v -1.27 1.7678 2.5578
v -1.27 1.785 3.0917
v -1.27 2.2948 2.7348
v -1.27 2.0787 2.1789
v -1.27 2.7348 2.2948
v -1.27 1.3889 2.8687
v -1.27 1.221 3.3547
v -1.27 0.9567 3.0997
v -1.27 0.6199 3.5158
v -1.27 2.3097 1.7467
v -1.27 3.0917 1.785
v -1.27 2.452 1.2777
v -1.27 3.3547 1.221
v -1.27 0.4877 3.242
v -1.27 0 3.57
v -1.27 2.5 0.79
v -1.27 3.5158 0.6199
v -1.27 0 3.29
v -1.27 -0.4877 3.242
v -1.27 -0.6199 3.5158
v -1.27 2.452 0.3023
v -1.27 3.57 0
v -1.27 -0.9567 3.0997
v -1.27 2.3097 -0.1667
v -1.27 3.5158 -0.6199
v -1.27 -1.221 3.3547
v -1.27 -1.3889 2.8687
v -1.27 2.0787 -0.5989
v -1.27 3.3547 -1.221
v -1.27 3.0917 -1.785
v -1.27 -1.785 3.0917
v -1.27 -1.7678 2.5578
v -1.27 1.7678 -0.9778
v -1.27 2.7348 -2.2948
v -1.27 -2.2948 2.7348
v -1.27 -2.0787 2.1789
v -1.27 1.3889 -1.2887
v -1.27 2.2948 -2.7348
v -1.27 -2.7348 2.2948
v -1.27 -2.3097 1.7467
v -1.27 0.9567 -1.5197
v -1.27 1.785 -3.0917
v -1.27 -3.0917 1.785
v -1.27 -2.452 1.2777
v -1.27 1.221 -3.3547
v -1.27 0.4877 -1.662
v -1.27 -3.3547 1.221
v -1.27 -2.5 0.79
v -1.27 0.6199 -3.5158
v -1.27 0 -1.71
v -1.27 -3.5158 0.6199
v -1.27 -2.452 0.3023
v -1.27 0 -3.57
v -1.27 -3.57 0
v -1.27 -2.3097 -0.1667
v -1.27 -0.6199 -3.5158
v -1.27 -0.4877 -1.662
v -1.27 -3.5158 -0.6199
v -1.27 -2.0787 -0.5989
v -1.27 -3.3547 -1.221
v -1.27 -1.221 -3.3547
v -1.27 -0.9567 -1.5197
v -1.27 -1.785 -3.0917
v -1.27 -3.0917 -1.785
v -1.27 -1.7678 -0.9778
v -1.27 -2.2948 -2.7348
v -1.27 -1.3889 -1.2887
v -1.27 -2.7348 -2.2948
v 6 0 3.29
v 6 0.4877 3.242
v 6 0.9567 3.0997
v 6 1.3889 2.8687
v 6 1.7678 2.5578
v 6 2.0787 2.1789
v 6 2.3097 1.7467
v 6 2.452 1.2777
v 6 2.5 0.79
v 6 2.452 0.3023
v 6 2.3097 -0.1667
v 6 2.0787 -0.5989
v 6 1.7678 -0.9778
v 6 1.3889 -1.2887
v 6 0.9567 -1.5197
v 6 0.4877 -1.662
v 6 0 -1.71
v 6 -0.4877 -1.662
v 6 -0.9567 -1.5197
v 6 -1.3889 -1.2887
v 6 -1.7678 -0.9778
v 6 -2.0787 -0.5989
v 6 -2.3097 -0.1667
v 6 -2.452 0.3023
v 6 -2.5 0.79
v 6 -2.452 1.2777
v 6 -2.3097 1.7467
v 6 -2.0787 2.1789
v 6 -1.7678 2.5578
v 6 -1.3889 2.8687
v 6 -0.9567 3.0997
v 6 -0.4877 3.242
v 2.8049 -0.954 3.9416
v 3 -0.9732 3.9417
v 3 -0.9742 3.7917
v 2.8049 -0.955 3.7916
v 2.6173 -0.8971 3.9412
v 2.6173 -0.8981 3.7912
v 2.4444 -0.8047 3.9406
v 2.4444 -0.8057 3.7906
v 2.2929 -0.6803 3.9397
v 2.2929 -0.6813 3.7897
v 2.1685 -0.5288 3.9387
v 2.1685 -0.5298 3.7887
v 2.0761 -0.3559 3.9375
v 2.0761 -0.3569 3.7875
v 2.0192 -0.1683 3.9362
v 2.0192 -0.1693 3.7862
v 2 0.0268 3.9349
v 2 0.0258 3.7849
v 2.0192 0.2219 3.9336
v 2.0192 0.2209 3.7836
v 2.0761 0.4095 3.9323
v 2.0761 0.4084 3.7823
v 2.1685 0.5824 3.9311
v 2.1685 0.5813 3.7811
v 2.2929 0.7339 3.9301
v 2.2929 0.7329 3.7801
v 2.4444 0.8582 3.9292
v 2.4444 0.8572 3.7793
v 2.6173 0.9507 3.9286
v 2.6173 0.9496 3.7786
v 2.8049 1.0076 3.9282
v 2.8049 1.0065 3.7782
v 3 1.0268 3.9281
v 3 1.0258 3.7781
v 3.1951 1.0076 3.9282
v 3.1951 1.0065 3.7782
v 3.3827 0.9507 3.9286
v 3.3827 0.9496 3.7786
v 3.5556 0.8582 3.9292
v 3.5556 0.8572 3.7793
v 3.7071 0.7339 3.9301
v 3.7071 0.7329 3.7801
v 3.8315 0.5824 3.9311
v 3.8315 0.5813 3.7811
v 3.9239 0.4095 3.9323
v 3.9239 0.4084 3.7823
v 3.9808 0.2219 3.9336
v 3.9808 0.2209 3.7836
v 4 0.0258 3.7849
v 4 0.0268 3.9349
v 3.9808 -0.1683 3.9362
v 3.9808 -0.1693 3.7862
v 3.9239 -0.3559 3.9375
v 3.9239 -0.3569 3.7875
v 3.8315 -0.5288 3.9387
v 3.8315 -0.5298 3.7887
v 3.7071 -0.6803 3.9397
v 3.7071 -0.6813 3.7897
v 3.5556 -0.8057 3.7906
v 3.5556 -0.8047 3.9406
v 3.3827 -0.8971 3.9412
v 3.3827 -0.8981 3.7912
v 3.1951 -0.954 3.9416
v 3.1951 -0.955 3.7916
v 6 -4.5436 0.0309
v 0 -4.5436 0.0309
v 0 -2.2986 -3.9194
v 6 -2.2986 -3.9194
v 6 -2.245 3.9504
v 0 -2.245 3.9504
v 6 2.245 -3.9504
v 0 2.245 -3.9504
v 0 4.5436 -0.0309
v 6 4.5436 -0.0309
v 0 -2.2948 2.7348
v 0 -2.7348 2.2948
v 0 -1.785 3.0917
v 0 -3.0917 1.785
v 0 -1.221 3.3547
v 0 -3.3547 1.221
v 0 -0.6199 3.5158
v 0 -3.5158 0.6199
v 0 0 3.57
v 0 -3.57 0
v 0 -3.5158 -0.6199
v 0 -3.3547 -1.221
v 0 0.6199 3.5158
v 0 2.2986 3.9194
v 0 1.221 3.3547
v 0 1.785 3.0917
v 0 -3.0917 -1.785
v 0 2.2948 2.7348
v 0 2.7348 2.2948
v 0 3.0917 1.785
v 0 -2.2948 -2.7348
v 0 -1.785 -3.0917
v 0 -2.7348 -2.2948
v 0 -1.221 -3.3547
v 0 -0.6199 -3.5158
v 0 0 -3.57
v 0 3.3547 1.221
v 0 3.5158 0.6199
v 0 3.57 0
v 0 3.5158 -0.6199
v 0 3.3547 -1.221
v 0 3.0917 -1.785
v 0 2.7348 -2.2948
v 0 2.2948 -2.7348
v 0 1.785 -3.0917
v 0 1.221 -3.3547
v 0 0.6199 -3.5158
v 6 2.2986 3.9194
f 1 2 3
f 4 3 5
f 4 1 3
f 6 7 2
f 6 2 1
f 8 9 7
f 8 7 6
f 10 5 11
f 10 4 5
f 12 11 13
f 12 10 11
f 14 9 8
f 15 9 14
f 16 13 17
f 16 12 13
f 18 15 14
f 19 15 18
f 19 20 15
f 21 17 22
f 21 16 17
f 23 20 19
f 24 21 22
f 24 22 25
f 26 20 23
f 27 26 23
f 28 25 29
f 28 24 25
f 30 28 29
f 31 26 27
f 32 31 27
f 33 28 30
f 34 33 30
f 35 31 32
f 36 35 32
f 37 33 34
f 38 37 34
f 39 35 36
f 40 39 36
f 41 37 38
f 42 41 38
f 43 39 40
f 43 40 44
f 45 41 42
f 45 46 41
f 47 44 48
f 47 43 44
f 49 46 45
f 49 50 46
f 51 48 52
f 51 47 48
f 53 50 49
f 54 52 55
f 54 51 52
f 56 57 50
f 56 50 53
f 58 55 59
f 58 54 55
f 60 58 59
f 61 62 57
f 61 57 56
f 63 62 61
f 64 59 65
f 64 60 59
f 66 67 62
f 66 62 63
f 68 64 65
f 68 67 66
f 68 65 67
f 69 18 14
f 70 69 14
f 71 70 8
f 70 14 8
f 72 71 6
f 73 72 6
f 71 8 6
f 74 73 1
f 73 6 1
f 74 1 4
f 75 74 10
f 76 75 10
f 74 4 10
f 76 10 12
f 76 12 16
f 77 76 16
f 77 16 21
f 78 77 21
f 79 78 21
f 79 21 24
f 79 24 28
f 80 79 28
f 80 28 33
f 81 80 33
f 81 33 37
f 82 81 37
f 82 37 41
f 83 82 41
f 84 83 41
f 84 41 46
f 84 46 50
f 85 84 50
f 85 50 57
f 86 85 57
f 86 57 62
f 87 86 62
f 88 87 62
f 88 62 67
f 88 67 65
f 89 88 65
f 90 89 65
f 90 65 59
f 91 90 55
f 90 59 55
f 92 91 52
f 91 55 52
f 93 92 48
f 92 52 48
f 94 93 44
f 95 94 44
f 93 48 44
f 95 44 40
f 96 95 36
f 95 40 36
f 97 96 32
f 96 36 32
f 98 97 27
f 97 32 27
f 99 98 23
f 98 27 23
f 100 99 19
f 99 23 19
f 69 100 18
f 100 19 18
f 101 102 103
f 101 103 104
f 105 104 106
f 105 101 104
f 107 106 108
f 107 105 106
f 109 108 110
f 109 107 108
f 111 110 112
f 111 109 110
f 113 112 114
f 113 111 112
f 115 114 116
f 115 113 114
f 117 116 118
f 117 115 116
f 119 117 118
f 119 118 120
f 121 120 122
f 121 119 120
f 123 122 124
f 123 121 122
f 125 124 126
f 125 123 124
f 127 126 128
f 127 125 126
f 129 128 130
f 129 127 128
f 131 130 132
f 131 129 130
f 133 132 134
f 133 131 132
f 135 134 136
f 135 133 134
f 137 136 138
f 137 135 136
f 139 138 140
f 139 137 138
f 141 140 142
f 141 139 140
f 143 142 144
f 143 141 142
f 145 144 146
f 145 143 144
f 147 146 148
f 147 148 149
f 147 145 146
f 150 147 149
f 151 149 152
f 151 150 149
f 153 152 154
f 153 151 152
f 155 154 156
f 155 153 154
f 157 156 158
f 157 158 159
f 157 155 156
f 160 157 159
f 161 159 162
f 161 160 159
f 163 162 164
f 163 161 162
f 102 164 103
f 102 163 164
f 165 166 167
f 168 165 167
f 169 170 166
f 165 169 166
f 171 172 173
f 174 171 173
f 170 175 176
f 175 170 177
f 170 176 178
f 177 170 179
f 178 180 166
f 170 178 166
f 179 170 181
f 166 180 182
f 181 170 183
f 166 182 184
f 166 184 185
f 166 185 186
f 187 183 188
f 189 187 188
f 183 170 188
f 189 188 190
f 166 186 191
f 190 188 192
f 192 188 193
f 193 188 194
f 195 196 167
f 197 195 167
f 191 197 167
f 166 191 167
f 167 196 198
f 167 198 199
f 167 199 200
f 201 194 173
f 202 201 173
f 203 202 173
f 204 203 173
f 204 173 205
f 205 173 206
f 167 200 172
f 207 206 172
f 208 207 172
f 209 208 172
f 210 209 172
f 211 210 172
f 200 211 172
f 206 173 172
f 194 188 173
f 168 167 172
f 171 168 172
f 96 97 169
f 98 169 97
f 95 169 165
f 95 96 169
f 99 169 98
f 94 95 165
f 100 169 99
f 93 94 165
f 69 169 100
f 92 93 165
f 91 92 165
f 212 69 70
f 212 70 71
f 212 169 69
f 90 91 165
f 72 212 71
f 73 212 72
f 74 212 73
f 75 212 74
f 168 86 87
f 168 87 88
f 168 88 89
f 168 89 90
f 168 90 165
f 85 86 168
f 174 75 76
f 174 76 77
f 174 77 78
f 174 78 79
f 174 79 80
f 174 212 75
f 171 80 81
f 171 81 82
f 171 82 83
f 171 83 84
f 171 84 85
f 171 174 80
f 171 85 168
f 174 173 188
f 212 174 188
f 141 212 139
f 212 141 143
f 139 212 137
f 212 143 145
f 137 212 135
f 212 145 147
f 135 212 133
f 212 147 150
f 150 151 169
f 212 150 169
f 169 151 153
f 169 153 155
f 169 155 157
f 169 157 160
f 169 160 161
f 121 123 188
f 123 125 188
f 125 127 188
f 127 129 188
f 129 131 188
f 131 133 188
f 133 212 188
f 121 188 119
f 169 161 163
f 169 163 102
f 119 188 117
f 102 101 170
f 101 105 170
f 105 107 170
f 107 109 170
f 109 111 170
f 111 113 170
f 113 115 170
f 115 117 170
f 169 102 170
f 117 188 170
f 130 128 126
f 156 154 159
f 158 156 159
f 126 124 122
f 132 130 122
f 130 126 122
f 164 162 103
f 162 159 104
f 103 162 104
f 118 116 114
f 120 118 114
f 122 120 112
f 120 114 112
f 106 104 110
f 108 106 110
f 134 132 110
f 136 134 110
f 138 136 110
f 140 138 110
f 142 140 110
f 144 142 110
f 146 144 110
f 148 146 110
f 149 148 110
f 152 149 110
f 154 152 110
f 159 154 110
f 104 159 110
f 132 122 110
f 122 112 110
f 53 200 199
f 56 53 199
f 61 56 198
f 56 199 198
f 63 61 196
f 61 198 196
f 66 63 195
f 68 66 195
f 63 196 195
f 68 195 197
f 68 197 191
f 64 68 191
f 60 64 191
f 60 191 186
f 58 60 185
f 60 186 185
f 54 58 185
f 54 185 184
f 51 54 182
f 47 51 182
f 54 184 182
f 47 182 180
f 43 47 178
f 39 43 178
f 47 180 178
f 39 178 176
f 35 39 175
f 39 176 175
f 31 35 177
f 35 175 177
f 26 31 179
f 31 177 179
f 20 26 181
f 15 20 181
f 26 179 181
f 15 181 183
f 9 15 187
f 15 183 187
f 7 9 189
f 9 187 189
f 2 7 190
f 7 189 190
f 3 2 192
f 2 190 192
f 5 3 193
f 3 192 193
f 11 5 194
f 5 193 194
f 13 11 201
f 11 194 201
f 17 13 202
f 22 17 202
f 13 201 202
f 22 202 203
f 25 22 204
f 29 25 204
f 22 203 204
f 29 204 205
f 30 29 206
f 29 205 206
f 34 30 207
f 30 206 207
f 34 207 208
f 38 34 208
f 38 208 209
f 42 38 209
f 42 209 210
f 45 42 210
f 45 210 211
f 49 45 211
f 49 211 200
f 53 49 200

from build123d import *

# Parameters (mm, degrees)
BOSS_EXTRUDE1_DEPTH = 6
SKETCH4_R           = 3.57
BOSS_EXTRUDE2_DEPTH = 1.27
SKETCH3_R           = 2.5
CUT_EXTRUDE1_DEPTH  = 10.439442655
SKETCH5_R           = 1
CUT_EXTRUDE3_DEPTH  = 0.15


with BuildPart() as part:
    # Sketch2 → Boss-Extrude1 (new body)
    with BuildSketch(Plane(origin=(0, 0, 0), x_dir=(0, 0, -1), z_dir=(1, 0, 0))):
        Polygon((3.919437566, -2.29861752), (3.950379949, 2.245023741), (0.030942383, 4.54364126), (-3.919437566, 2.29861752), (-3.950379949, -2.245023741), (-0.030942383, -4.54364126), align=None)
    extrude(amount=BOSS_EXTRUDE1_DEPTH)

    # Sketch4 → Boss-Extrude2 (add)
    with BuildSketch(Plane.ZY):
        with Locations(Location((0, 0, 0), (0, 0, 180))):
            Circle(SKETCH4_R)
    extrude(amount=BOSS_EXTRUDE2_DEPTH)

    # Sketch3 → Cut-Extrude1 (cut, through all)
    with BuildSketch(Plane.ZY.offset(1.27)):
        with Locations((0.79, 0)):
            Circle(SKETCH3_R)
    extrude(amount=-CUT_EXTRUDE1_DEPTH, mode=Mode.SUBTRACT)

    # Sketch5 → Cut-Extrude3 (cut)
    with BuildSketch(Plane(origin=(0, 0.02679689, 3.934908757), x_dir=(1, 0, 0), z_dir=(0, -0.006809882993303443, -0.9999768124779782))):
        with Locations(Location((3, 0, 0), (0, 0, 90))):
            Circle(SKETCH5_R)
    extrude(amount=CUT_EXTRUDE3_DEPTH, mode=Mode.SUBTRACT)


solid = part.part
